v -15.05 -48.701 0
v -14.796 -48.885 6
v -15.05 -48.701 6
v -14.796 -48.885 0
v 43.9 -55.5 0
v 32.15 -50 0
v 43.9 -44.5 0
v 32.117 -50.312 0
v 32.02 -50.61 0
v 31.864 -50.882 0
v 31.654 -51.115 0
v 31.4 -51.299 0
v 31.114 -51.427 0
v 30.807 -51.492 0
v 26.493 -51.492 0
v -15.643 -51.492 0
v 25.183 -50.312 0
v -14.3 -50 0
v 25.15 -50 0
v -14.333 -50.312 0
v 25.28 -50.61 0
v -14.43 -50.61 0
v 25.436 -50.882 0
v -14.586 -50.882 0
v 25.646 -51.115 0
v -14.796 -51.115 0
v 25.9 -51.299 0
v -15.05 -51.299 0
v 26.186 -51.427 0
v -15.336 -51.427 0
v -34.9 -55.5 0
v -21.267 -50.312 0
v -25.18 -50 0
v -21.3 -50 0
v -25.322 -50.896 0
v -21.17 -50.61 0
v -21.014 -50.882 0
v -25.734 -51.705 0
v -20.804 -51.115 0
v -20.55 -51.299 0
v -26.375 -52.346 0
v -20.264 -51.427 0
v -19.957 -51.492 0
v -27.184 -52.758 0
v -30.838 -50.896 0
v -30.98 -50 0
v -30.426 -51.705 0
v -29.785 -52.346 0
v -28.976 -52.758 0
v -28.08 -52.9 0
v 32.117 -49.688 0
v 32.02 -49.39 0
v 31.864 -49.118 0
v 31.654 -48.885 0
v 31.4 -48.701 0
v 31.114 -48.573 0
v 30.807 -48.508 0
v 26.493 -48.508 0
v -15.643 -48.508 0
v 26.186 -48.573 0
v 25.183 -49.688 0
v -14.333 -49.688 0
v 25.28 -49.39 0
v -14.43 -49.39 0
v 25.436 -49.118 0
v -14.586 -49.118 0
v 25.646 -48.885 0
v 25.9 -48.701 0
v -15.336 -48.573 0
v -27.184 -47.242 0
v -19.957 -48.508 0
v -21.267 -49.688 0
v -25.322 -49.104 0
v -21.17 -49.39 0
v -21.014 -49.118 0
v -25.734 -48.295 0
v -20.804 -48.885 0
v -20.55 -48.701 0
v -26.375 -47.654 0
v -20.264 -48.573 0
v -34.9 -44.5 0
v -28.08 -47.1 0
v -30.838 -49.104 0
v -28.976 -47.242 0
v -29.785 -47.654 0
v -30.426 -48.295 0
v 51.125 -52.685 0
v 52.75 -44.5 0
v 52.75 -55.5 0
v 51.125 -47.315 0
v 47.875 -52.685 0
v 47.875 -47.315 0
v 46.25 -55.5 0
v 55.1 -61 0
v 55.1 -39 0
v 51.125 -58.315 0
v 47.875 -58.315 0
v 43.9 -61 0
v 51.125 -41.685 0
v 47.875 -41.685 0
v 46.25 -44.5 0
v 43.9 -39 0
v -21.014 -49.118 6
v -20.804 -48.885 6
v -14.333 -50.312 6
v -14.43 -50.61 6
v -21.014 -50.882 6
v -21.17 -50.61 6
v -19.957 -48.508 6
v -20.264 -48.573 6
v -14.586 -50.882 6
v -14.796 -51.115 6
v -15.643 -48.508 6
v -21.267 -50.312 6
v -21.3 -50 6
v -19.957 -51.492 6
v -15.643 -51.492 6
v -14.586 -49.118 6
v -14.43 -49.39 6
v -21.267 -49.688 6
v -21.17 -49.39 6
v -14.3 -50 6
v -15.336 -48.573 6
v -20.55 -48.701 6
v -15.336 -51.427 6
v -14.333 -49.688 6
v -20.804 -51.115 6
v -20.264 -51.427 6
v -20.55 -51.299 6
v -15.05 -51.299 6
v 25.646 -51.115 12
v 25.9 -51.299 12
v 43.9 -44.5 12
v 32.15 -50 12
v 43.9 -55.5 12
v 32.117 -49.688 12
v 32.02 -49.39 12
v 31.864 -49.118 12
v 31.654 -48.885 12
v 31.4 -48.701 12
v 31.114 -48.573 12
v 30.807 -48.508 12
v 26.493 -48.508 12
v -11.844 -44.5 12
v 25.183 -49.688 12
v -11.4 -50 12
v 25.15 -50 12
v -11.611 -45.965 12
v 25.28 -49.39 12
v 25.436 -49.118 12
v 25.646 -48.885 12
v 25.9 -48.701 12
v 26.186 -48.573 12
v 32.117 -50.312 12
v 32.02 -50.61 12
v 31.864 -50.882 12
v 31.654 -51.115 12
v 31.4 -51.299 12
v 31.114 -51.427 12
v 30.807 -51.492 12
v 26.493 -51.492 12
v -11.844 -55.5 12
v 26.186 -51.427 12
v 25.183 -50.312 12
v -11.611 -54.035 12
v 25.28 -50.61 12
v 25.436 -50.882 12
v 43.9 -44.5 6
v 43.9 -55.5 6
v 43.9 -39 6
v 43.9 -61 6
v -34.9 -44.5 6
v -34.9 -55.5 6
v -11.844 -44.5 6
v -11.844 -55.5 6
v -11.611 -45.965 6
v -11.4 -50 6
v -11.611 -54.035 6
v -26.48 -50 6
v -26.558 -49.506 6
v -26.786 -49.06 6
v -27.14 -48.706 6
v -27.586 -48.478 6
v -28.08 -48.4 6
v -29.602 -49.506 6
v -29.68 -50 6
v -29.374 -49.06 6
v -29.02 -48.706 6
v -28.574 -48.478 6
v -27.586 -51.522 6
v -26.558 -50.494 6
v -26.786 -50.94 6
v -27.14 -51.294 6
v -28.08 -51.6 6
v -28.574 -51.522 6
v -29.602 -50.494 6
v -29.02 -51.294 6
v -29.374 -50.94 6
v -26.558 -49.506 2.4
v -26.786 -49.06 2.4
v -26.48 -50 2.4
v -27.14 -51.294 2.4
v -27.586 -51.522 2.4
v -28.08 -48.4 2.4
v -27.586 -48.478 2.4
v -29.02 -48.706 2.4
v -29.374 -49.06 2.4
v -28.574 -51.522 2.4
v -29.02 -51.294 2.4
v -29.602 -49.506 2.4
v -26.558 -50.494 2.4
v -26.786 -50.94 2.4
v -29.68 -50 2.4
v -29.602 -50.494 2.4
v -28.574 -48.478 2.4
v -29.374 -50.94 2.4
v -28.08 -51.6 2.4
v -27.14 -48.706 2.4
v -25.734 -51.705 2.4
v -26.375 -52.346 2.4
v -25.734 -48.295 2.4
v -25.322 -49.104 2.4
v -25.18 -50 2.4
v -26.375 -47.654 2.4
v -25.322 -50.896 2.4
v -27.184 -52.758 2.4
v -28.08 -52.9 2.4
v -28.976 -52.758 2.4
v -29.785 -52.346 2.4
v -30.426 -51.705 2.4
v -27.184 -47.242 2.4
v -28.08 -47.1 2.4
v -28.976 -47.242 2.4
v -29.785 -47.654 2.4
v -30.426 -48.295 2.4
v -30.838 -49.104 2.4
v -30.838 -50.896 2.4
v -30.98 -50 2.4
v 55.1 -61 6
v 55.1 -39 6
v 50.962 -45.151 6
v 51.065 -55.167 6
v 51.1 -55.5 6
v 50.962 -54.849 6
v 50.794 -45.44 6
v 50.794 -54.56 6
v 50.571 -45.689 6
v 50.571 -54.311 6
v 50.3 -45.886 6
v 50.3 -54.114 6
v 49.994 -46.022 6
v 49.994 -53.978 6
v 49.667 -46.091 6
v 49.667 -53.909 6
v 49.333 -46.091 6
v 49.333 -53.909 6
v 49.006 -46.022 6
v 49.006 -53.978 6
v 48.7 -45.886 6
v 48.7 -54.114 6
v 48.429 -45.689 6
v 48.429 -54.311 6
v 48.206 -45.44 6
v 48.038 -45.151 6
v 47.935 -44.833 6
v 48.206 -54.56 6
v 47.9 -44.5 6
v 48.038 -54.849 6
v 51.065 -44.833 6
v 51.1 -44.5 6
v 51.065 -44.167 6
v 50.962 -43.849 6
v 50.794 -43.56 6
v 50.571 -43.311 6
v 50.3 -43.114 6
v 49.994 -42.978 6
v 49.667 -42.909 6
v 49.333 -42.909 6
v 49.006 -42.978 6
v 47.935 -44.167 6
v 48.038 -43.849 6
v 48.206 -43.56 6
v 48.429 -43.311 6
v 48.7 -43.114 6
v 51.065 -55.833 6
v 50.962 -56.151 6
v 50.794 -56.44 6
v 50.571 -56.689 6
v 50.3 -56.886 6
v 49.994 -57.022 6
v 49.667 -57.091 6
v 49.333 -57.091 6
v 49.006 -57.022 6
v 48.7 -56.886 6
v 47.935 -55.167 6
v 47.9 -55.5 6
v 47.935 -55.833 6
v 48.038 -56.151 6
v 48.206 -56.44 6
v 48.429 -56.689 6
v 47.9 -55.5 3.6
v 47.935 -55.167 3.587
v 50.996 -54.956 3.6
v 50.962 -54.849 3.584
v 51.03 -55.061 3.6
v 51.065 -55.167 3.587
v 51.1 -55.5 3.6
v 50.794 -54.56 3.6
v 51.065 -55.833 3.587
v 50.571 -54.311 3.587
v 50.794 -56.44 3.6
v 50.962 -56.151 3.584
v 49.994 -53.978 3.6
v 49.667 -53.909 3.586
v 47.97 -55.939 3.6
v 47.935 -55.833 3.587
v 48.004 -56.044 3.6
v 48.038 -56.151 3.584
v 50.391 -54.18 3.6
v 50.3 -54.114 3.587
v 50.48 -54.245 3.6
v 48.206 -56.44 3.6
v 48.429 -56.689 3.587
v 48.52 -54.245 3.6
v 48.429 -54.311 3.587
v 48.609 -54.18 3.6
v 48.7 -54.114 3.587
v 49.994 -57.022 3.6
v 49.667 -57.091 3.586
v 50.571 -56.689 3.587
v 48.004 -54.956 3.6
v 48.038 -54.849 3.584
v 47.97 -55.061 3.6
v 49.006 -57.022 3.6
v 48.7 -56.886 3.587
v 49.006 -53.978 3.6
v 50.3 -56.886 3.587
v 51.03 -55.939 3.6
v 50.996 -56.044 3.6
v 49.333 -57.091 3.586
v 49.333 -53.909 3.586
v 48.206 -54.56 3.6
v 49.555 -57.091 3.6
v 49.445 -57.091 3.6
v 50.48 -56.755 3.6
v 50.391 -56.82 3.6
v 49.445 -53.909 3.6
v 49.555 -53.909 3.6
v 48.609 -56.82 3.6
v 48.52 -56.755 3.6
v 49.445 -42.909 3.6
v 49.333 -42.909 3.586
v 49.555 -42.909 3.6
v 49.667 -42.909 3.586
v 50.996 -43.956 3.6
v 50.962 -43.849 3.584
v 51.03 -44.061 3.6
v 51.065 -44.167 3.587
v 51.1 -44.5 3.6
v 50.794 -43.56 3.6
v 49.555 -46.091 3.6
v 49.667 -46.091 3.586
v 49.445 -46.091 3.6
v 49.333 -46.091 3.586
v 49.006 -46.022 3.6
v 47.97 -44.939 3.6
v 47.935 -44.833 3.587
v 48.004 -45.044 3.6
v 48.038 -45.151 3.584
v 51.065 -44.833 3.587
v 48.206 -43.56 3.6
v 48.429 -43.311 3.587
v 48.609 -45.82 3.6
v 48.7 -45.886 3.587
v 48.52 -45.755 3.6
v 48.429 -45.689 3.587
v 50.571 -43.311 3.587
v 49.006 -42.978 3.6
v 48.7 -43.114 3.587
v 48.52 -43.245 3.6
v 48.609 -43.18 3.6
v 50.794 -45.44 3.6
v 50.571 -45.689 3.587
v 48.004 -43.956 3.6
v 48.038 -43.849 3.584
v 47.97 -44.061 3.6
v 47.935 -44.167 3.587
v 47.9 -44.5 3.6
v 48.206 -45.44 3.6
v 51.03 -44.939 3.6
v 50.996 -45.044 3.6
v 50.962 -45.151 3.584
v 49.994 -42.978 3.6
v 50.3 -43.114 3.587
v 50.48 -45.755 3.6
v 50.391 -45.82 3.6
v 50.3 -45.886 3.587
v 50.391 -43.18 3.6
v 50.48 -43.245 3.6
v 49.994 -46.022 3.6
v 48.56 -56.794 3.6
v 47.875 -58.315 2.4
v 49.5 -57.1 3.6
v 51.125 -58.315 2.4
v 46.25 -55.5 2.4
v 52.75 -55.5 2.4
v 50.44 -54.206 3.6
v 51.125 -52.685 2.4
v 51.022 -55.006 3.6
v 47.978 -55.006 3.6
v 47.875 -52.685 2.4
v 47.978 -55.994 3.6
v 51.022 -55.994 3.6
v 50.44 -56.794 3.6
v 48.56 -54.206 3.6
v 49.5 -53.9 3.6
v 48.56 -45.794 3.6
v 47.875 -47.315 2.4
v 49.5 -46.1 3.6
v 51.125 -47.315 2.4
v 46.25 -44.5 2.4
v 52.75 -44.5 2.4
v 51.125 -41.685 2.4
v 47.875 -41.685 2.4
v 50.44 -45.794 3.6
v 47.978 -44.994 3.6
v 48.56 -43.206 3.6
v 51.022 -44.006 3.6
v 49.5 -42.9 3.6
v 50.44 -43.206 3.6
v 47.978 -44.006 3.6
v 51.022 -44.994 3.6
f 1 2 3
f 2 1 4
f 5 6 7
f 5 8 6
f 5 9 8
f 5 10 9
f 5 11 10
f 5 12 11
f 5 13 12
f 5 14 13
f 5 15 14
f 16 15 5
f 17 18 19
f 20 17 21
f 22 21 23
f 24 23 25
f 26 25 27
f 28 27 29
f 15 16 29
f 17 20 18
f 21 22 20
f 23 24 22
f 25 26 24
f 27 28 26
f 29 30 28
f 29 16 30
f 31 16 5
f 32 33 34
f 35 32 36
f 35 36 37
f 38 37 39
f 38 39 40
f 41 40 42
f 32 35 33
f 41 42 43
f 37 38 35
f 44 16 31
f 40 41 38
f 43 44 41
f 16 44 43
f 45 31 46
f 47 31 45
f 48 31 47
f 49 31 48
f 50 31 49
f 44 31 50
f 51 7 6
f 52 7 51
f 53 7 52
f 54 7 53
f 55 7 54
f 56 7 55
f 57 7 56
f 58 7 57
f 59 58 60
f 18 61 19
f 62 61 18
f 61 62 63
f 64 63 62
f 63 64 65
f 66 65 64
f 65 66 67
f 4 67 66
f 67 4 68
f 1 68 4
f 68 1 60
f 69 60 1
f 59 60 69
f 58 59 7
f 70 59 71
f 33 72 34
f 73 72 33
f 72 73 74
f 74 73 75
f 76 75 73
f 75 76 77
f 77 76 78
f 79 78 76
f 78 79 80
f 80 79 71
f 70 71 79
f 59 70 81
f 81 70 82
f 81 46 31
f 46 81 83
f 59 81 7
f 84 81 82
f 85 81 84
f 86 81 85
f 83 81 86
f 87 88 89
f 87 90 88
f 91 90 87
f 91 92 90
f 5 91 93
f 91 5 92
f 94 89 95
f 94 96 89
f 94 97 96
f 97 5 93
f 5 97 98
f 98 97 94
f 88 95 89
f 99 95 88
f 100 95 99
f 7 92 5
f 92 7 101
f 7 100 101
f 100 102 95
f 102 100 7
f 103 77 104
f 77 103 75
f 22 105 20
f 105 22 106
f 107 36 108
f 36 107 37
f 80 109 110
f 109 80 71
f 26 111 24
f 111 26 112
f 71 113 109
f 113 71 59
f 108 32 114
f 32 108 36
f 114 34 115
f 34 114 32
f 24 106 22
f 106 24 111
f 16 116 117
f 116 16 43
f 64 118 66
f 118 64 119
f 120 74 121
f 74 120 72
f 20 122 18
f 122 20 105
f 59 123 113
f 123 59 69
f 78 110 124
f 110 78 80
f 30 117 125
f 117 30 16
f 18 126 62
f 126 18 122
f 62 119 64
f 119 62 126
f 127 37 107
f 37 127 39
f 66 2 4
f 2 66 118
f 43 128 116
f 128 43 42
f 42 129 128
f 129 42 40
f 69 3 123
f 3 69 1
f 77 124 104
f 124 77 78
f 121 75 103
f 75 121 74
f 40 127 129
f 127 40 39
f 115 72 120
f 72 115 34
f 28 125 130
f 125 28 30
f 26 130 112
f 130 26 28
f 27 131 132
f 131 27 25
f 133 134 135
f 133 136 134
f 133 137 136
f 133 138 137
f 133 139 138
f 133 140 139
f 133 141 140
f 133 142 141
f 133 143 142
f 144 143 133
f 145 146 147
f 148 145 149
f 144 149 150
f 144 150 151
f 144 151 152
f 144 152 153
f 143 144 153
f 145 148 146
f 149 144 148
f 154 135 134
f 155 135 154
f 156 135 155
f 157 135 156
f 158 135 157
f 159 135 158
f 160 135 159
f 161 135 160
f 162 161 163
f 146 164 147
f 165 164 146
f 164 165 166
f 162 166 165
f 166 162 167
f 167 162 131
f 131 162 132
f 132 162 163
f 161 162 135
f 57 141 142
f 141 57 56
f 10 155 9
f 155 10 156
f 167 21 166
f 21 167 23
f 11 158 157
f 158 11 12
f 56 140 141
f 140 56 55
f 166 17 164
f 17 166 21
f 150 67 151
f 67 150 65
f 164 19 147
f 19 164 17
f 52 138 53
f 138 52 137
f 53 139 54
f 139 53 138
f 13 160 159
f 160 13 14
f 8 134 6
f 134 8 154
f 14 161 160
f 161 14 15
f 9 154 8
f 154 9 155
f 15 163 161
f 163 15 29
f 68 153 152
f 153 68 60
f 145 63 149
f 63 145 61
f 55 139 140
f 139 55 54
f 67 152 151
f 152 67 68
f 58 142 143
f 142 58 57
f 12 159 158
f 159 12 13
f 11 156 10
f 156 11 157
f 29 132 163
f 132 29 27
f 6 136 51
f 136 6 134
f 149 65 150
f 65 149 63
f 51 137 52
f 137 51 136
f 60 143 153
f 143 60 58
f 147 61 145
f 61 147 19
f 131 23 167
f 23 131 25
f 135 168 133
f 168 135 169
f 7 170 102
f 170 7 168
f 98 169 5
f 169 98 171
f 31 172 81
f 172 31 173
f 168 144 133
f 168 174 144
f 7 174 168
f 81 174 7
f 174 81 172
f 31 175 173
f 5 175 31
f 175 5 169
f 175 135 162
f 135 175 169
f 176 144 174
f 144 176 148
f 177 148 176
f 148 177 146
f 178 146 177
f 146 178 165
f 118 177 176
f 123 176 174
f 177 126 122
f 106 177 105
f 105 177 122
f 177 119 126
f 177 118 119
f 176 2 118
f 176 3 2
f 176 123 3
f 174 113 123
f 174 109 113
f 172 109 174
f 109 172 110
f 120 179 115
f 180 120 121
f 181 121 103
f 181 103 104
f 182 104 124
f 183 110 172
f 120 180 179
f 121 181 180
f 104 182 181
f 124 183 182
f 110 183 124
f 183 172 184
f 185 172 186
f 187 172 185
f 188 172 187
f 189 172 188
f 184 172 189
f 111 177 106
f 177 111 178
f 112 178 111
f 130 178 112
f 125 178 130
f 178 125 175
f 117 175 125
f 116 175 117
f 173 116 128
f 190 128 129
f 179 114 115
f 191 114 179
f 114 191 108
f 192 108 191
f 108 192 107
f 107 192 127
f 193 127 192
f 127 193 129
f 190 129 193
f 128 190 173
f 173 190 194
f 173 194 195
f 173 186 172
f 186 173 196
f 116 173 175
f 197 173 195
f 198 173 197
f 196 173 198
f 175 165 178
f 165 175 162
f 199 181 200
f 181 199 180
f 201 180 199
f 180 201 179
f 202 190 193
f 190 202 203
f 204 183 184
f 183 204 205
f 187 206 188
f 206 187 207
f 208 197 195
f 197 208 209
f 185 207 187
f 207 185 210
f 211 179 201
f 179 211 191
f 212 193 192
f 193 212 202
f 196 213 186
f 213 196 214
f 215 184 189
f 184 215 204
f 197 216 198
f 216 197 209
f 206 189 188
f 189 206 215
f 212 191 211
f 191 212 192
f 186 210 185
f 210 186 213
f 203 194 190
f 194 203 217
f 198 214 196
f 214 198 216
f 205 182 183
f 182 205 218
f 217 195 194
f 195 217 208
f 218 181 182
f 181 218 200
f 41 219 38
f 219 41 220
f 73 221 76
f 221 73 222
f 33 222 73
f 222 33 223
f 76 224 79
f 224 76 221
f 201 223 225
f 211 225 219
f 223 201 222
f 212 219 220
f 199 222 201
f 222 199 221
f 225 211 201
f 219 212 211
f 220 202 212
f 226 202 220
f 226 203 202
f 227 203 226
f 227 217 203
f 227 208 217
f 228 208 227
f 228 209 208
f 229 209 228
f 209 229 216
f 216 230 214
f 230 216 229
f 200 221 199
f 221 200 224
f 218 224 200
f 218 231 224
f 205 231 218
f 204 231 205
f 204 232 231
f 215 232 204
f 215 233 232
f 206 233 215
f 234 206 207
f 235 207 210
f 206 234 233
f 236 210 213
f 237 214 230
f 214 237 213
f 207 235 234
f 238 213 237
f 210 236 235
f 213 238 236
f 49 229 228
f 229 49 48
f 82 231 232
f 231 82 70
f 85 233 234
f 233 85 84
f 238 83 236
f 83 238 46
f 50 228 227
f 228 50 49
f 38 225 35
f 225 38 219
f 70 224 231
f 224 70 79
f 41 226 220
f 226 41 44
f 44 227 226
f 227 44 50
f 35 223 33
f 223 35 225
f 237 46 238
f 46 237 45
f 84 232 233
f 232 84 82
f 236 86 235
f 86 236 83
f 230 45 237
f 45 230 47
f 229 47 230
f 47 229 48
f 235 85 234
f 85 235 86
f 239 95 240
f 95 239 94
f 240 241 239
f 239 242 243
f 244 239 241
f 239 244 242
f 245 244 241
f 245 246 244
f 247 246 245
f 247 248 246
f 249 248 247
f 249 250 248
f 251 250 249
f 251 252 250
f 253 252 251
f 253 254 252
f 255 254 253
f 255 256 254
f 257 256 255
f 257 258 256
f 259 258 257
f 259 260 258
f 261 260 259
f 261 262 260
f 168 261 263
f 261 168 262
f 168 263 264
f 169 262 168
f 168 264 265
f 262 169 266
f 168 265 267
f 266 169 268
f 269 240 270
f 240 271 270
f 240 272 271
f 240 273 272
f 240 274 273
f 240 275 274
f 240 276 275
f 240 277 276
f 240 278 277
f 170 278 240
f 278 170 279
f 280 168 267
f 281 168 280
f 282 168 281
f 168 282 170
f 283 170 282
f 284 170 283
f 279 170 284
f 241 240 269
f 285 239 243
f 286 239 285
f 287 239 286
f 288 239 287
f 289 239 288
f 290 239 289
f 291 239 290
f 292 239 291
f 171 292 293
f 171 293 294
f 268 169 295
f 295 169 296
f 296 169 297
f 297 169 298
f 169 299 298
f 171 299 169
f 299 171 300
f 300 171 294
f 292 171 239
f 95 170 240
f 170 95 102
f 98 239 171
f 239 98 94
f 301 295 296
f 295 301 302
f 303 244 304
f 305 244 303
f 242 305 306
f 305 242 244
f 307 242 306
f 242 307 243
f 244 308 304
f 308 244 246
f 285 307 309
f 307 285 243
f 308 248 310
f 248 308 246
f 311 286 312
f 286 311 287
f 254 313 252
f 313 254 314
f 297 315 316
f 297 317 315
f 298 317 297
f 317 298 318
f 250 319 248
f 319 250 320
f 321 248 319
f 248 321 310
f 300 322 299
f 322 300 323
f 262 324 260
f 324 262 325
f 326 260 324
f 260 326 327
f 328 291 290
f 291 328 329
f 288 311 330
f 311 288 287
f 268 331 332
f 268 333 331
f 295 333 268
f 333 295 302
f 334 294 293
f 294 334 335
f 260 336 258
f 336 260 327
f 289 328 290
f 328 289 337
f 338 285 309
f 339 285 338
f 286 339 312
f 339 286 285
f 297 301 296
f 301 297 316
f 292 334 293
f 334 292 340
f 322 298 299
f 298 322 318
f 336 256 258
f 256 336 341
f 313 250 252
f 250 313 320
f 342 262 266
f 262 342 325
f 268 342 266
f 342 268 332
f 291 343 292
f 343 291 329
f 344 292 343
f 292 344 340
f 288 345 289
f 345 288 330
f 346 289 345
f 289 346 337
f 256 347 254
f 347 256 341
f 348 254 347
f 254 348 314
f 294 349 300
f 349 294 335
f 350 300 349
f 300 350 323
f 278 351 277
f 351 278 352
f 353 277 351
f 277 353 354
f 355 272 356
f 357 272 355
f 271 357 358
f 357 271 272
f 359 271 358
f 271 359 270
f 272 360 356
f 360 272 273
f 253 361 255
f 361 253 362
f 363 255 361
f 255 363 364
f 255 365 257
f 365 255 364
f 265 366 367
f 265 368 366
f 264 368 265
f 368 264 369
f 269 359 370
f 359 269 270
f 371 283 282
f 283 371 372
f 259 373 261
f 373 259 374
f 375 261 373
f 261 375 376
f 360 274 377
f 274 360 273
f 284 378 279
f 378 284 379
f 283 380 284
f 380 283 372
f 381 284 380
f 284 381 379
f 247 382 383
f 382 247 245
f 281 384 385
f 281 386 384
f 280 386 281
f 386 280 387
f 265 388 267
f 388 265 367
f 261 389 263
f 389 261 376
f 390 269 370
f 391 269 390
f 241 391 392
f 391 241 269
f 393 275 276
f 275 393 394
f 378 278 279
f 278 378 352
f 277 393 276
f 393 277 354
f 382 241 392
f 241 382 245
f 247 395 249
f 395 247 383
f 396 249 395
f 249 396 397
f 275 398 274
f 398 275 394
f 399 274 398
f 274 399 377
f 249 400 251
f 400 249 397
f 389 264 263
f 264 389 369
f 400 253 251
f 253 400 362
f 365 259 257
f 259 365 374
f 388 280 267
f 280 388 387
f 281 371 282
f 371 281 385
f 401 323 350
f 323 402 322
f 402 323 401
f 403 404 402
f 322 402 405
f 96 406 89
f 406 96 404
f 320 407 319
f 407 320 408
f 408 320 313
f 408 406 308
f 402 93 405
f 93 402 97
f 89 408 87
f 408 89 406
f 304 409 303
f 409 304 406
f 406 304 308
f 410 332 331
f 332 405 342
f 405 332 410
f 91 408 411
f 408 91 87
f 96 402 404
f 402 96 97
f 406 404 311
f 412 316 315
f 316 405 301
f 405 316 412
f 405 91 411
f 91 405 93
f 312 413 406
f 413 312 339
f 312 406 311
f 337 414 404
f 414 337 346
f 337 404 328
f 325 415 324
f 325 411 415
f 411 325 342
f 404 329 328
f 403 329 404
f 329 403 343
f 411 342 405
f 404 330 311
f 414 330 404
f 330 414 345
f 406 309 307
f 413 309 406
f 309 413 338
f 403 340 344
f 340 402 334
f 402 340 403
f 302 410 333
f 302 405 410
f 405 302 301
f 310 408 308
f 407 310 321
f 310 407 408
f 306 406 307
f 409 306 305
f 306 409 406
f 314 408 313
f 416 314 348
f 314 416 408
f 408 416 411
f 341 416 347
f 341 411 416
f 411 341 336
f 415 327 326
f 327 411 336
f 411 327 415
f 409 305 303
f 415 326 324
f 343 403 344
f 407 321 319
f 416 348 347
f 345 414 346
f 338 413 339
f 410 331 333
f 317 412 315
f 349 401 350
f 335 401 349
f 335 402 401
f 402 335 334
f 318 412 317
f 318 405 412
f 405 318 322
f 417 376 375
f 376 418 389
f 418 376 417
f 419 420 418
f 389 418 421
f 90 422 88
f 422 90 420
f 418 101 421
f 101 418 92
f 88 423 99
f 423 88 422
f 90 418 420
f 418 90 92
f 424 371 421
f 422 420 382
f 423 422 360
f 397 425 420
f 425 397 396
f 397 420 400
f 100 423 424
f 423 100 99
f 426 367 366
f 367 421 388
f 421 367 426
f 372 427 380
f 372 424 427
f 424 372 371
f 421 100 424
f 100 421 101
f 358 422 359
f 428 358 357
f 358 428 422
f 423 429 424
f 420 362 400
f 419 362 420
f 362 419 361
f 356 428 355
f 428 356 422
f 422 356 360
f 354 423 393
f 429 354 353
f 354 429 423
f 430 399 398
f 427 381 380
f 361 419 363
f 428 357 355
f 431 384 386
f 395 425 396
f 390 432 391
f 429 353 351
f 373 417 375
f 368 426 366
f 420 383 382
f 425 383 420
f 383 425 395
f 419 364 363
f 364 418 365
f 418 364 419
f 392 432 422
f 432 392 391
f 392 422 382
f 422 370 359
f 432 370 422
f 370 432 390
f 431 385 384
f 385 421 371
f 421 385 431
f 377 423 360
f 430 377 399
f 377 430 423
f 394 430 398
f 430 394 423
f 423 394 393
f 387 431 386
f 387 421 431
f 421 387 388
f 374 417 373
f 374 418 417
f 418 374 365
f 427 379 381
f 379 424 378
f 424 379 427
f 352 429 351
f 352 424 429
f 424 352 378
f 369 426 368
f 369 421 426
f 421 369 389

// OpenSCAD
use <bed_carriage.scad>

height = 12;
translate([-50,-50]) arm();
